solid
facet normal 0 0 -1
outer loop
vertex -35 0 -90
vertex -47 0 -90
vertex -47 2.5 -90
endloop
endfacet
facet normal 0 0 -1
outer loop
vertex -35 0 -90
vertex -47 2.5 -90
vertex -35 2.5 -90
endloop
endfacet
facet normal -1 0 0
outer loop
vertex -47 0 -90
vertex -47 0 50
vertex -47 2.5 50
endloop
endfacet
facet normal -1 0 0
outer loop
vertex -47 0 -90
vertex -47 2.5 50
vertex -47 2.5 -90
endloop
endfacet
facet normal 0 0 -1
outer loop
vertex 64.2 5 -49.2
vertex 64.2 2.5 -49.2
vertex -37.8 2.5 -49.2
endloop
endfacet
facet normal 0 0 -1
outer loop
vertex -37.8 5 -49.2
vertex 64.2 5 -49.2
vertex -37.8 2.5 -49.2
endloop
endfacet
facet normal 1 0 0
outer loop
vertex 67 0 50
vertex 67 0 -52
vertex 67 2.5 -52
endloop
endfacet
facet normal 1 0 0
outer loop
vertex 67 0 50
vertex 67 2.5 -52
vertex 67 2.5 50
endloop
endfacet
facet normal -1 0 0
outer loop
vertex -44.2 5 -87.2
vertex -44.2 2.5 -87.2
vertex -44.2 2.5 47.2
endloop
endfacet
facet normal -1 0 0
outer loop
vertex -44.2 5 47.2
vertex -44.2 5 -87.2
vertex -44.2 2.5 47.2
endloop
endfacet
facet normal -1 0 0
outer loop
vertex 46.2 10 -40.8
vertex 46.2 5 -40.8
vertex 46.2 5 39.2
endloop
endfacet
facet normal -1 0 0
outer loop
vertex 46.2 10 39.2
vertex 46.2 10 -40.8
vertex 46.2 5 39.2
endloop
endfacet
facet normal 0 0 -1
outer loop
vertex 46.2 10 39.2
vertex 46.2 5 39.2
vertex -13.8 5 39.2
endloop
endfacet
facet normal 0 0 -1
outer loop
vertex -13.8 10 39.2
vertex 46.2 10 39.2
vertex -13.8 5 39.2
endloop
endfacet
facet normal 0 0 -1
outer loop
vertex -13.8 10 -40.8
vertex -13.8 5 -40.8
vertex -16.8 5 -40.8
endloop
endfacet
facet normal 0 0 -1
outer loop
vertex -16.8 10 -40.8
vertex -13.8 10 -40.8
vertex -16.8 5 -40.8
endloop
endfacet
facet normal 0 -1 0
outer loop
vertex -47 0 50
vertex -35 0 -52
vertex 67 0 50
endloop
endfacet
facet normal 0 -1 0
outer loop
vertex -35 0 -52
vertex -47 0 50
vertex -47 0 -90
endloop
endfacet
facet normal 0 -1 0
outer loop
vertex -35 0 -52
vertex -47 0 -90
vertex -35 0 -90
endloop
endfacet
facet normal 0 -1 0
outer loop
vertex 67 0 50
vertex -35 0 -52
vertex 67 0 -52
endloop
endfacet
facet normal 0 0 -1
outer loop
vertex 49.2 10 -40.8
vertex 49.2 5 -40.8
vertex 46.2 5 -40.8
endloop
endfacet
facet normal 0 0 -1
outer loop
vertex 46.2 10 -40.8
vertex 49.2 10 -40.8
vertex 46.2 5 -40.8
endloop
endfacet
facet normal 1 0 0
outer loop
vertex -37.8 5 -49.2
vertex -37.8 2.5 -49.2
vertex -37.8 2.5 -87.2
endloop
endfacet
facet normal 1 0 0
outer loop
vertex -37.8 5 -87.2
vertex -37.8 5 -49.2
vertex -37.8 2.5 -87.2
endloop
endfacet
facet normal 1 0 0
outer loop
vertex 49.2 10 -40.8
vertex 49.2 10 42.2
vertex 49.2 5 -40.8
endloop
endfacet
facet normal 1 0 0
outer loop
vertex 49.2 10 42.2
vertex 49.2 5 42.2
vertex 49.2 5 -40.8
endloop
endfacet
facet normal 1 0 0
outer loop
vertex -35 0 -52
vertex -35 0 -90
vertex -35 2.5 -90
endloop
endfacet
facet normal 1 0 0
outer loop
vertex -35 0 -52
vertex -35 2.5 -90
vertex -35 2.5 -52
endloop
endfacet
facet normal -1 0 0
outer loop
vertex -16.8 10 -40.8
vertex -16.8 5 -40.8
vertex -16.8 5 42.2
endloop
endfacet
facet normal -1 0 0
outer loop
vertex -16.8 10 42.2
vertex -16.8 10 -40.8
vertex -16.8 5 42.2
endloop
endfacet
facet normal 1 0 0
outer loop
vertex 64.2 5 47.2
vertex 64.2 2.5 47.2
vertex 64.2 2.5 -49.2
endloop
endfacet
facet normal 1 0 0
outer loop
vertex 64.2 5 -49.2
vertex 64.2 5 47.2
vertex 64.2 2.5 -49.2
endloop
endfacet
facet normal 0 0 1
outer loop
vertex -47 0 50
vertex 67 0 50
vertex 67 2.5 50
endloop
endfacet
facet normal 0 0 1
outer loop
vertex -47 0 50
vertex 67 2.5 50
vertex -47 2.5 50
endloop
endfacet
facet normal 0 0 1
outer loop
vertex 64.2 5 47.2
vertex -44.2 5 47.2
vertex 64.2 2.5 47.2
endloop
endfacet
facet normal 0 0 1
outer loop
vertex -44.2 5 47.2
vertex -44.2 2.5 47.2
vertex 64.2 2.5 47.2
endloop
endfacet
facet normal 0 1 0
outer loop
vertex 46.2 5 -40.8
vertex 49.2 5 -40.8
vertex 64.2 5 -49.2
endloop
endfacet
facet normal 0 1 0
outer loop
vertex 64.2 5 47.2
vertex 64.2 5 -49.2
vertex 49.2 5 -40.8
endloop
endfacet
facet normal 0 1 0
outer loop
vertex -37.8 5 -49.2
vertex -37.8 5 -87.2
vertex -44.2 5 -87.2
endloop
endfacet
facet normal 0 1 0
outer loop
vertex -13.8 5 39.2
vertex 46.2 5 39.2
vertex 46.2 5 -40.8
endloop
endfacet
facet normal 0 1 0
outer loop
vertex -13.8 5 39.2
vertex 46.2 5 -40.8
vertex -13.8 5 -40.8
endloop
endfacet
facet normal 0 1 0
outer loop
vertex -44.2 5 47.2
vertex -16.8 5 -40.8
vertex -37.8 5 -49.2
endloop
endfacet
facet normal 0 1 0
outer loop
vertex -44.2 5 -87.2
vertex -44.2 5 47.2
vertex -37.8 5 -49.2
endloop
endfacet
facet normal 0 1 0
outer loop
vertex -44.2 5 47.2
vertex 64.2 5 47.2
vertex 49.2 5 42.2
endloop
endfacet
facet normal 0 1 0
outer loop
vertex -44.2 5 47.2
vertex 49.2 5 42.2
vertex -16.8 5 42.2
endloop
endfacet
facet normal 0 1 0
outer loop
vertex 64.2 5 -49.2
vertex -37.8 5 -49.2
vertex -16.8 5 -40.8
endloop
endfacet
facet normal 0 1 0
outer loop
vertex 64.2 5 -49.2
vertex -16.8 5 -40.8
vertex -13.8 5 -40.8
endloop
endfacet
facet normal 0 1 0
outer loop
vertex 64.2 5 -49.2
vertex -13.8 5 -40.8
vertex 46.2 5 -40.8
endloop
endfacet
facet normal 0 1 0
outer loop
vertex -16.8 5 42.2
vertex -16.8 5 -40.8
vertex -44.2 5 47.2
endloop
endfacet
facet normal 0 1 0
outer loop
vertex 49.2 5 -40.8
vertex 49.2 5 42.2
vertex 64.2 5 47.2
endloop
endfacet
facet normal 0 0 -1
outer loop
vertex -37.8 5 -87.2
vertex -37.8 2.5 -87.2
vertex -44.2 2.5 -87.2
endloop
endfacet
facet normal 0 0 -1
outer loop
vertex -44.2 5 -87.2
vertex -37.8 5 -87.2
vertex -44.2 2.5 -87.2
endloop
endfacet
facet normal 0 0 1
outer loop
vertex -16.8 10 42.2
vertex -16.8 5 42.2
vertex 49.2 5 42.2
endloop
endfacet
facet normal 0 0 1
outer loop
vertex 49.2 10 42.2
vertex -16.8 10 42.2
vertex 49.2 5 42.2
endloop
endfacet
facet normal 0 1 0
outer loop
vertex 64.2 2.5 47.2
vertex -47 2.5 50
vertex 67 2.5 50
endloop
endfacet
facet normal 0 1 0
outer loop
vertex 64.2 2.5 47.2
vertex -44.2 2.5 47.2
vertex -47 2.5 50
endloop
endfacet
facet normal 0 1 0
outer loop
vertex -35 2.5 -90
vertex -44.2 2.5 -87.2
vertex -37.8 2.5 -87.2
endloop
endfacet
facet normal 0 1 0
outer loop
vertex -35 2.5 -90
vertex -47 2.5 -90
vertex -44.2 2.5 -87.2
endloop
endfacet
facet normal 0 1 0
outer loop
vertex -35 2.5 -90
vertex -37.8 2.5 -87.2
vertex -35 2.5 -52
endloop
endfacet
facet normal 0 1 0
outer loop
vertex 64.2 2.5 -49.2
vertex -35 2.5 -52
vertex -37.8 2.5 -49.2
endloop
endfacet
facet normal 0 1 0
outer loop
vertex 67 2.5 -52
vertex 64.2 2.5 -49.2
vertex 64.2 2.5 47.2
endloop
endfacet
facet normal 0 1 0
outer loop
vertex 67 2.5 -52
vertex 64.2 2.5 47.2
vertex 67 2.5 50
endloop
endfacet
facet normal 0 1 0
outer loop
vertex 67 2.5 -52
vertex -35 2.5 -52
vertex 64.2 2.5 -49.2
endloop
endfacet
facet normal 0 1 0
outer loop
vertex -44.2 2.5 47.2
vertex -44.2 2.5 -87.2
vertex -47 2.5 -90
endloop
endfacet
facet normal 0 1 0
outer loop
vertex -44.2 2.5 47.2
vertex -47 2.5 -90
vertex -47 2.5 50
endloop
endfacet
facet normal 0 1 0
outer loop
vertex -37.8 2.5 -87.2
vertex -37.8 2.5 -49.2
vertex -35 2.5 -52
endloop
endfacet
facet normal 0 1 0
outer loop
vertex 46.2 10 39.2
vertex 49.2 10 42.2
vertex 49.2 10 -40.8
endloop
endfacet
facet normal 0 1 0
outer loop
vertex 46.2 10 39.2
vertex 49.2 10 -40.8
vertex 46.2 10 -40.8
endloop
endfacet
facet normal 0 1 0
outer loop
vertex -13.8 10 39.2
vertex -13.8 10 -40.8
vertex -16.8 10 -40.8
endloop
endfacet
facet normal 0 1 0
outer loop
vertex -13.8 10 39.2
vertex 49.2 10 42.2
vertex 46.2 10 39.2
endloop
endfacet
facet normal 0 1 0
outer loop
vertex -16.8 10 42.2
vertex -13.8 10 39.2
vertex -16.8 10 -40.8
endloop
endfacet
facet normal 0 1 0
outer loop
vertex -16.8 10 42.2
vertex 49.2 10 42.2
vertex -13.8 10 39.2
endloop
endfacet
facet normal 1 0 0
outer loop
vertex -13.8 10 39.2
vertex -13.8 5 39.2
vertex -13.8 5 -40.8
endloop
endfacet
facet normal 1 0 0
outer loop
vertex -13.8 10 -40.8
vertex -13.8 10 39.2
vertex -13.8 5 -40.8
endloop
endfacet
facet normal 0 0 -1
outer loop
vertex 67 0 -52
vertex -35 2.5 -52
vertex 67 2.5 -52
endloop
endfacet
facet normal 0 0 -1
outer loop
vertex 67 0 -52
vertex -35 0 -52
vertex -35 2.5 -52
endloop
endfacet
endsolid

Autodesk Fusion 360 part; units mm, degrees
sketch "Sketch1" plane through (0, 0, 0) normal (0, 1, 0) x (1, 0, 0)
  line L0 (67, -50) -> (-47, -50)
  line L1 (-47, -50) -> (-47, 90)
  line L2 (-47, 90) -> (-35, 90)
  line L3 (-35, 90) -> (-35, 52)
  line L4 (-35, 52) -> (67, 52)
  line L5 (67, 52) -> (67, -50)
  line L6 (65.2, -48.2) -> (-45.2, -48.2)
  line L7 (-45.2, -48.2) -> (-45.2, 88.2)
  line L8 (-45.2, 88.2) -> (-36.8, 88.2)
  line L9 (-36.8, 88.2) -> (-36.8, 50.2)
  line L10 (-36.8, 50.2) -> (65.2, 50.2)
  line L11 (65.2, 50.2) -> (65.2, -48.2)
  dimension "d1" = 102
  dimension "d3" = 140
  dimension "d4" = 12
  dimension "d5" = 102
  dimension "d6" = 1.8
extrude "Extrude1" add sketch "Sketch1" along normal blind 2.5 contours L0 L1 L2 L3 L4 L5 | L6 L7 L8 L9 L10 L11
sketch "Sketch2" plane through (0, 2.5, 0) normal (0, 1, 0) x (-1, 0, 0)
  line L0 (-67, -52) -> (35, -52)
  line L1 (35, -52) -> (35, -90)
  line L2 (35, -90) -> (47, -90)
  line L3 (47, -90) -> (47, 50)
  line L4 (47, 50) -> (-67, 50)
  line L5 (-67, 50) -> (-67, -52)
  line L6 (37.8, -87.2) -> (44.2, -87.2)
  line L7 (44.2, -87.2) -> (44.2, 47.2)
  line L8 (44.2, 47.2) -> (-64.2, 47.2)
  line L9 (-64.2, 47.2) -> (-64.2, -49.2)
  line L10 (-64.2, -49.2) -> (37.8, -49.2)
  line L11 (37.8, -49.2) -> (37.8, -87.2)
  dimension "d9" = -2.8
extrude "Extrude2" add sketch "Sketch2" along normal blind 2.5 contours L6 L7 L8 L9 L10 L11
sketch "Sketch3" plane through (0, 5, 0) normal (0, 1, 0) x (-1, 0, 0)
  line L0 (37.8, -49.2) -> (37.8, -87.2)
  line L1 (37.8, -87.2) -> (44.2, -87.2)
  line L2 (44.2, -87.2) -> (44.2, 47.2)
  line L3 (44.2, 47.2) -> (-64.2, 47.2)
  line L4 (-64.2, 47.2) -> (-64.2, -49.2)
  line L5 (-64.2, -49.2) -> (37.8, -49.2)
  line L6 (16.8, -40.8) -> (16.8, 42.2)
  line L7 (16.8, 42.2) -> (-49.2, 42.2)
  line L8 (-49.2, 42.2) -> (-49.2, -40.8)
  line L9 (-49.2, -40.8) -> (-46.2, -40.8)
  line L10 (-46.2, -40.8) -> (-46.2, 39.2)
  line L11 (-46.2, 39.2) -> (13.8, 39.2)
  line L12 (13.8, 39.2) -> (13.8, -40.8)
  line L13 (13.8, -40.8) -> (16.8, -40.8)
  dimension "d12" = 60
  dimension "d13" = 80
  dimension "d14" = 3
  dimension "d15" = 3
  dimension "d16" = 3
  dimension "d17" = 5
  dimension "d18" = 15
extrude "Extrude3" add sketch "Sketch3" along normal blind 5 contours L6 L7 L8 L9 L10 L11 L12 L13
equation "d15 = d14"
equation "d16 = d14"
